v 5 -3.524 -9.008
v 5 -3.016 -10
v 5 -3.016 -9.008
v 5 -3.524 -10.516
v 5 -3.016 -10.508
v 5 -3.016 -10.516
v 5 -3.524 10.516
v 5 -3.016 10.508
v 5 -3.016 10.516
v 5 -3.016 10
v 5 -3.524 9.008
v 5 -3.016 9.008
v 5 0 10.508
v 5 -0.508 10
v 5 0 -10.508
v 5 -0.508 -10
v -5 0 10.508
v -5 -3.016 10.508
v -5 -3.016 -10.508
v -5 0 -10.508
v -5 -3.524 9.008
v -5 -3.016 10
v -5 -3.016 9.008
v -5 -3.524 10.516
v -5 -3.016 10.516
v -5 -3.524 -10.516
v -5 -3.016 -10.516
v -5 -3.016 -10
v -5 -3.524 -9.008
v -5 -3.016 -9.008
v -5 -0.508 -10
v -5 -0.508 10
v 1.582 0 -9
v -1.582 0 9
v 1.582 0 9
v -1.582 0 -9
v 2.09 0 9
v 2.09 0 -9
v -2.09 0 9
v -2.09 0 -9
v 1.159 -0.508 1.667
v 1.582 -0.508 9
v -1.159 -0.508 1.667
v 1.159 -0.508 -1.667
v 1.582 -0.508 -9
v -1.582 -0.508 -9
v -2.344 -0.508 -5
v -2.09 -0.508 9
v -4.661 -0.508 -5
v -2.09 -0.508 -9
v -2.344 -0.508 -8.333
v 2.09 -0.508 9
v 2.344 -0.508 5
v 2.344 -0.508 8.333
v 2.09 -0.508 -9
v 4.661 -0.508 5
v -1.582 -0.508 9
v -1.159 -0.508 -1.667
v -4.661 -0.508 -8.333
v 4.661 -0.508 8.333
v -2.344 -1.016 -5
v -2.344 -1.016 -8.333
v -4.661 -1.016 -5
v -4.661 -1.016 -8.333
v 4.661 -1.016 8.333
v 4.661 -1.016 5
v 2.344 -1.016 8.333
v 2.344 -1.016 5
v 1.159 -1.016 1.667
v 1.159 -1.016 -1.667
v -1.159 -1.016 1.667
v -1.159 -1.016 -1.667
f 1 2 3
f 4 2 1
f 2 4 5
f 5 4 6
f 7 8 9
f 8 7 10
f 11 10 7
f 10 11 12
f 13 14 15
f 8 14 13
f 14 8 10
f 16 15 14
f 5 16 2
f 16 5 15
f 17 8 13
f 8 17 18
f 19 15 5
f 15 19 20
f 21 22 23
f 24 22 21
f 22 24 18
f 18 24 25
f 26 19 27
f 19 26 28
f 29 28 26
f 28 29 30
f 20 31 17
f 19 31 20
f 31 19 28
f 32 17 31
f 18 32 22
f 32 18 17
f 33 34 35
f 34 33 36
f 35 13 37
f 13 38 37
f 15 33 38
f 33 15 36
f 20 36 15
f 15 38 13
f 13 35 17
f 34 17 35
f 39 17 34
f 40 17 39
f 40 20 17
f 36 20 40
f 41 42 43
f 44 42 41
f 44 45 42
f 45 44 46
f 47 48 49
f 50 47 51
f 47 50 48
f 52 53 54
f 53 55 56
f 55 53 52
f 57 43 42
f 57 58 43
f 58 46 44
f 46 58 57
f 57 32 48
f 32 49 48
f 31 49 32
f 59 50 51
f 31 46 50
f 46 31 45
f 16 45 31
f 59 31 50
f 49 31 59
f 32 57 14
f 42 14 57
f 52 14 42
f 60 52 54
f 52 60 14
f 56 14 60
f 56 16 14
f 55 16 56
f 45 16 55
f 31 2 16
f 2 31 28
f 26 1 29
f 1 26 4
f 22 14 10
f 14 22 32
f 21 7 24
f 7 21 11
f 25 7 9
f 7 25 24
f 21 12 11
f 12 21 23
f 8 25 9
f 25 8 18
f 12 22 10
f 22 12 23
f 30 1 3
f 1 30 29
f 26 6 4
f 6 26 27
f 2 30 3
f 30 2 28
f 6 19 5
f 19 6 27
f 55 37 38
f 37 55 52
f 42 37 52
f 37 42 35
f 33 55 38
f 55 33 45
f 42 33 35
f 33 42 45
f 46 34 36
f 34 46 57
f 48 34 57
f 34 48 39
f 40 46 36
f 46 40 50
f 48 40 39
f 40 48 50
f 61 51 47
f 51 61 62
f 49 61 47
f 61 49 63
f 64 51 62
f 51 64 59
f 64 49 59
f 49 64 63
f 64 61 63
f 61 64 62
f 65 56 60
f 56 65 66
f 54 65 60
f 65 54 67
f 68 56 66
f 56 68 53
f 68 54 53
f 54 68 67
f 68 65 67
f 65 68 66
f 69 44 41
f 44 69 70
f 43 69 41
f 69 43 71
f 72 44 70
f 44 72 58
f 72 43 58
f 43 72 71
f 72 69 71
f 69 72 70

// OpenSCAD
//  
//  
//      |<--a--->|<-d->|
//  --   --------------                           --------------
//  /\  |              |                         |              |
//  b   |              |                         |              |
//  \/  |              |                         |              |
//  --  |         -----                           -----         |
//  /\  |        |                                     |        |
//  e   |        |                                     |        |
//  \/  |        |<–––––––––––––––––f–––––––––––––––––>|        |
//  --  |         -------------------------------------         |
//  /\  |                                                       |
//  c   |                                                       |
//  \/  |                                                       |
//  --   -------------------------------------------------------
//

a = 0.508;
b = 0.508;
c = 0.508;

d = 1;
e = 2+c;
f = 20;

g=10;
r=0.5;
cut = c;
distance = 4;
h=c;

module example002()
{
	union() {
		difference() {
			union() {
				translate([0, -c/2, 0])
					cube([g, c, f+2*a], center = true);

				translate([0, -(e+b+c)/2, -(f+a)/2])
					cube([g, e+c+b, a], center = true);
				translate([0, -(e+b+c)/2, +(f+a)/2])
					cube([g, e+c+b, a], center = true);

				translate([0, -(e+c+b/2), +((f+a)/2+a-d)])
					cube([g, b, a+d], center = true);
				translate([0, -(e+c+b/2), -((f+a)/2+a-d)])
					cube([g, b, a+d], center = true);
			}
			translate([g/6+cut/3, 0, 0])
				cube([cut, 2*c, f-2*d], center = true);
			translate([-(g/6+cut/3), 0, 0])
				cube([cut, 2*c, f-2*d], center = true);
		}
		translate([-(g/3+cut/3), -(c/2+h), -f/3])
			cube([(g-6*cut)/3, c, f/6], center = true);
		translate([g/3+cut/3, -(c/2+h), f/3])
			cube([(g-6*cut)/3, c, f/6], center = true);
		translate([0, -(c/2+h), 0])
			cube([(g-6*cut)/3, c, f/6], center = true);
	}		
}

example002();
